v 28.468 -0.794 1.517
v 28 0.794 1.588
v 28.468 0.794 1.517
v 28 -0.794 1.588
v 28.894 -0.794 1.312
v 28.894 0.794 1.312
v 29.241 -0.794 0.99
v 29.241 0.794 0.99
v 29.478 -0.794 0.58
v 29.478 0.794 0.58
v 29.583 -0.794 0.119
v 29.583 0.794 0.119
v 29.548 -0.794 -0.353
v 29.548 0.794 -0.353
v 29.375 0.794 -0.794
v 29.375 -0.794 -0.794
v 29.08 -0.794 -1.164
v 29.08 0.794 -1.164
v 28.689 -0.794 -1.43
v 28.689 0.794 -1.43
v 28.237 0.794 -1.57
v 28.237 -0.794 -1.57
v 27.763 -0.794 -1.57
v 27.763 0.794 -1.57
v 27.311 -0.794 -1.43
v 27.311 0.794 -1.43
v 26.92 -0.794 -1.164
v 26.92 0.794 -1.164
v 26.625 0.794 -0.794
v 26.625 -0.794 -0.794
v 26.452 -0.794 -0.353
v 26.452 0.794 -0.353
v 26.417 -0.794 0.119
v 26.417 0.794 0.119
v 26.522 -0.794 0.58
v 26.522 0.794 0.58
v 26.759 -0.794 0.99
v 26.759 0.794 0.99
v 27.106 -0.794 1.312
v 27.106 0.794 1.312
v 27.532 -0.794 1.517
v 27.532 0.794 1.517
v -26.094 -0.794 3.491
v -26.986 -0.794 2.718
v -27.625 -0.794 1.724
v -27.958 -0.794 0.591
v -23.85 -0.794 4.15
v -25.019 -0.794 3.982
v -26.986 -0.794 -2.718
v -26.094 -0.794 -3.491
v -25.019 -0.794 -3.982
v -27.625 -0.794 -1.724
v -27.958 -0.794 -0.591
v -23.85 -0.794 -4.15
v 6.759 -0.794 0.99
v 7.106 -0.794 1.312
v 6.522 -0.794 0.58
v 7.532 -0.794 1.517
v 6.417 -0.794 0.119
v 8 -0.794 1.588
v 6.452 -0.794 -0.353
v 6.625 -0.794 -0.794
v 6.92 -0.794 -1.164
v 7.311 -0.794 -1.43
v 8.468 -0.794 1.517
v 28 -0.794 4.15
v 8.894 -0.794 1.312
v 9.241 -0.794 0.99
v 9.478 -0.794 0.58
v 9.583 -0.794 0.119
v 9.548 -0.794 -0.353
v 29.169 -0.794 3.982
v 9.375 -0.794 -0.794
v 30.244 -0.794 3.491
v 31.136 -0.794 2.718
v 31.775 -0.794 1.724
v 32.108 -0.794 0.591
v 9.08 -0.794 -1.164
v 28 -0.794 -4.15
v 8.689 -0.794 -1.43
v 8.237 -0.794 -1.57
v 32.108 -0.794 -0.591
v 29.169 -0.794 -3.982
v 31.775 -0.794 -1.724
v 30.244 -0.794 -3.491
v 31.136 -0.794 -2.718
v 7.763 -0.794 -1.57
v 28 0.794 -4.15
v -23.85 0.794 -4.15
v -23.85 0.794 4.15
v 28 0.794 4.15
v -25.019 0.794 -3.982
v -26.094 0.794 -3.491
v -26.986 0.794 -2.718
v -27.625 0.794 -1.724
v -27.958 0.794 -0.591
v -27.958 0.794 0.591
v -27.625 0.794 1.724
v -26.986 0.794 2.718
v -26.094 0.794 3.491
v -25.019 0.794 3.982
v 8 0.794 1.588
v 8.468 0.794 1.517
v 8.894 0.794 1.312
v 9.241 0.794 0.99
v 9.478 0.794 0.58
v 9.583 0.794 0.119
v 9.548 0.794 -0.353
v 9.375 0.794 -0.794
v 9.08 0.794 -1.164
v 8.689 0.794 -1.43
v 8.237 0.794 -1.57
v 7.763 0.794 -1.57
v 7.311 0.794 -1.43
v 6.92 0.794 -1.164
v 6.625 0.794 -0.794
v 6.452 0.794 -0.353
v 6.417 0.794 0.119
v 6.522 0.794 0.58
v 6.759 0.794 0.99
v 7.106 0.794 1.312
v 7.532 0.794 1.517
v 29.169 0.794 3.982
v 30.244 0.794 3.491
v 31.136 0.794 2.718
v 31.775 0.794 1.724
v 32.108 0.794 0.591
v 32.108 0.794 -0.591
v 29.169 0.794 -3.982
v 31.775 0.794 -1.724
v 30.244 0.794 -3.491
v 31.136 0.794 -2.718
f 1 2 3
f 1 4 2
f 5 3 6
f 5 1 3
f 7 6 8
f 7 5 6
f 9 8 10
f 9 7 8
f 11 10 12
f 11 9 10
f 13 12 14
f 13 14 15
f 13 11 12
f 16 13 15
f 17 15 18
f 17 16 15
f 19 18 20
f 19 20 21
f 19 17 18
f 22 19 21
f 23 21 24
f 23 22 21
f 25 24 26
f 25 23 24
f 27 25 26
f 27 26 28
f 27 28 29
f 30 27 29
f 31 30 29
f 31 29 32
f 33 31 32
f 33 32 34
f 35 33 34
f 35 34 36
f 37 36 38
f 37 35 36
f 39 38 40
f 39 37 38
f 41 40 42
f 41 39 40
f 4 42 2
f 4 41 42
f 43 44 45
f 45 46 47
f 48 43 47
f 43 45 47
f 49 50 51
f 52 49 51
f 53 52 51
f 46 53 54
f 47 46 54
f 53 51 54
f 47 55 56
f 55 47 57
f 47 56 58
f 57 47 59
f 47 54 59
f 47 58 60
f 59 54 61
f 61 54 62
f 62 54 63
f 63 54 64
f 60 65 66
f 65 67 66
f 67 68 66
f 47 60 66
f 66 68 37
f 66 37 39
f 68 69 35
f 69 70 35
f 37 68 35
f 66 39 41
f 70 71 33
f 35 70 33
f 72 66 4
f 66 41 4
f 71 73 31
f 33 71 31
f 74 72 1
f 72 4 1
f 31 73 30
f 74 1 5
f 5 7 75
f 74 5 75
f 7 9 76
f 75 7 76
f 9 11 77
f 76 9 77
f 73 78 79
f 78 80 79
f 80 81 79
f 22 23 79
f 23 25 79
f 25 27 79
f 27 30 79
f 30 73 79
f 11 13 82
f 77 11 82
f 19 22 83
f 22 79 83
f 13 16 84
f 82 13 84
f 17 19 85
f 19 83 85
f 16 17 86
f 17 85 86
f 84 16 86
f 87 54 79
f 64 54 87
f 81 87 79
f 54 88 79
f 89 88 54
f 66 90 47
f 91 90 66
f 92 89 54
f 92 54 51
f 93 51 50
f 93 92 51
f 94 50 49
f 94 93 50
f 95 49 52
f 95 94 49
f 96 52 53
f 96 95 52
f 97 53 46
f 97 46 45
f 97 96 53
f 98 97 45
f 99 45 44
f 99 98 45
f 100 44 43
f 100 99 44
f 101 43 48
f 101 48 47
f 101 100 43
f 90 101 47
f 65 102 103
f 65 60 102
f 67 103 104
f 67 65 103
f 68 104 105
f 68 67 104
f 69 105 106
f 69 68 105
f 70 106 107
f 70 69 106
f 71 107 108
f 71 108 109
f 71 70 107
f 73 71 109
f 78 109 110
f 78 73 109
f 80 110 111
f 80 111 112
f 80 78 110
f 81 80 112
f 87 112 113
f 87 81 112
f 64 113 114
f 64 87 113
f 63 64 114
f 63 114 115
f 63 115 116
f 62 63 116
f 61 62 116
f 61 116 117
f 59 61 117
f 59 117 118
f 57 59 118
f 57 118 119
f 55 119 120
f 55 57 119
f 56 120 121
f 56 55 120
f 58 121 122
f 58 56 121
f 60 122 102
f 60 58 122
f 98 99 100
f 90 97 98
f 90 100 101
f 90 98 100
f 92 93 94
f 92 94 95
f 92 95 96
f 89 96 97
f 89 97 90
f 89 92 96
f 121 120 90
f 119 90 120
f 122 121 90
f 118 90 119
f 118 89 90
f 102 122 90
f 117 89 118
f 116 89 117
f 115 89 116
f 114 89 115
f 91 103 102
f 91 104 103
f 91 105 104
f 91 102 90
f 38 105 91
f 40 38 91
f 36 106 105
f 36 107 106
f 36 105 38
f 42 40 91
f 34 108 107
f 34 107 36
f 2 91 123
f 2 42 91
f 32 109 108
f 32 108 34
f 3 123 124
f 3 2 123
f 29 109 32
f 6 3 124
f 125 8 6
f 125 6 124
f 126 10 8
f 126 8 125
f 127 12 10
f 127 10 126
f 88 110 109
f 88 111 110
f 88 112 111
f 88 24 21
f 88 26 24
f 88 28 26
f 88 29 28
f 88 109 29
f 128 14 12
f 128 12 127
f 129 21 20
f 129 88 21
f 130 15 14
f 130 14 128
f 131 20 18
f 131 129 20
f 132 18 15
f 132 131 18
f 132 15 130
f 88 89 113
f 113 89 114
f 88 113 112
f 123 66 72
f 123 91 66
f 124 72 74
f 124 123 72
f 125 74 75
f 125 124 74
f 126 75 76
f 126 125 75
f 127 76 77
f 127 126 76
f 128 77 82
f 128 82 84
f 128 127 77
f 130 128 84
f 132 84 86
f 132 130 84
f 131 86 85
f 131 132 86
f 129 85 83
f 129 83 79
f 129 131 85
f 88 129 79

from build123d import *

# Parameters (mm, degrees)
SKETCH1_R           = 1.5875
BOSS_EXTRUDE1_DEPTH = 0.79375


with BuildPart() as part:
    # Sketch1 → Boss-Extrude1 (new, symmetric)
    with BuildSketch(Plane(origin=(0, 0, 0), x_dir=(1, 0, 0), z_dir=(0, 1, 0))):
        with BuildLine():
            Line((28, 4.15), (8, 4.15))
            Line((8, 4.15), (-23.85, 4.15))
            ThreePointArc((-23.85, 4.15), (-28, 0), (-23.85, -4.15))
            Line((-23.85, -4.15), (8, -4.15))
            Line((8, -4.15), (28, -4.15))
            ThreePointArc((28, -4.15), (32.15, 0), (28, 4.15))
        make_face()
        with Locations(Location((8, 0, 0), (0, 0, 270))):
            Circle(SKETCH1_R, mode=Mode.SUBTRACT)
        with Locations(Location((28, 0, 0), (0, 0, 270))):
            Circle(SKETCH1_R, mode=Mode.SUBTRACT)
    extrude(amount=BOSS_EXTRUDE1_DEPTH, both=True)


solid = part.part
